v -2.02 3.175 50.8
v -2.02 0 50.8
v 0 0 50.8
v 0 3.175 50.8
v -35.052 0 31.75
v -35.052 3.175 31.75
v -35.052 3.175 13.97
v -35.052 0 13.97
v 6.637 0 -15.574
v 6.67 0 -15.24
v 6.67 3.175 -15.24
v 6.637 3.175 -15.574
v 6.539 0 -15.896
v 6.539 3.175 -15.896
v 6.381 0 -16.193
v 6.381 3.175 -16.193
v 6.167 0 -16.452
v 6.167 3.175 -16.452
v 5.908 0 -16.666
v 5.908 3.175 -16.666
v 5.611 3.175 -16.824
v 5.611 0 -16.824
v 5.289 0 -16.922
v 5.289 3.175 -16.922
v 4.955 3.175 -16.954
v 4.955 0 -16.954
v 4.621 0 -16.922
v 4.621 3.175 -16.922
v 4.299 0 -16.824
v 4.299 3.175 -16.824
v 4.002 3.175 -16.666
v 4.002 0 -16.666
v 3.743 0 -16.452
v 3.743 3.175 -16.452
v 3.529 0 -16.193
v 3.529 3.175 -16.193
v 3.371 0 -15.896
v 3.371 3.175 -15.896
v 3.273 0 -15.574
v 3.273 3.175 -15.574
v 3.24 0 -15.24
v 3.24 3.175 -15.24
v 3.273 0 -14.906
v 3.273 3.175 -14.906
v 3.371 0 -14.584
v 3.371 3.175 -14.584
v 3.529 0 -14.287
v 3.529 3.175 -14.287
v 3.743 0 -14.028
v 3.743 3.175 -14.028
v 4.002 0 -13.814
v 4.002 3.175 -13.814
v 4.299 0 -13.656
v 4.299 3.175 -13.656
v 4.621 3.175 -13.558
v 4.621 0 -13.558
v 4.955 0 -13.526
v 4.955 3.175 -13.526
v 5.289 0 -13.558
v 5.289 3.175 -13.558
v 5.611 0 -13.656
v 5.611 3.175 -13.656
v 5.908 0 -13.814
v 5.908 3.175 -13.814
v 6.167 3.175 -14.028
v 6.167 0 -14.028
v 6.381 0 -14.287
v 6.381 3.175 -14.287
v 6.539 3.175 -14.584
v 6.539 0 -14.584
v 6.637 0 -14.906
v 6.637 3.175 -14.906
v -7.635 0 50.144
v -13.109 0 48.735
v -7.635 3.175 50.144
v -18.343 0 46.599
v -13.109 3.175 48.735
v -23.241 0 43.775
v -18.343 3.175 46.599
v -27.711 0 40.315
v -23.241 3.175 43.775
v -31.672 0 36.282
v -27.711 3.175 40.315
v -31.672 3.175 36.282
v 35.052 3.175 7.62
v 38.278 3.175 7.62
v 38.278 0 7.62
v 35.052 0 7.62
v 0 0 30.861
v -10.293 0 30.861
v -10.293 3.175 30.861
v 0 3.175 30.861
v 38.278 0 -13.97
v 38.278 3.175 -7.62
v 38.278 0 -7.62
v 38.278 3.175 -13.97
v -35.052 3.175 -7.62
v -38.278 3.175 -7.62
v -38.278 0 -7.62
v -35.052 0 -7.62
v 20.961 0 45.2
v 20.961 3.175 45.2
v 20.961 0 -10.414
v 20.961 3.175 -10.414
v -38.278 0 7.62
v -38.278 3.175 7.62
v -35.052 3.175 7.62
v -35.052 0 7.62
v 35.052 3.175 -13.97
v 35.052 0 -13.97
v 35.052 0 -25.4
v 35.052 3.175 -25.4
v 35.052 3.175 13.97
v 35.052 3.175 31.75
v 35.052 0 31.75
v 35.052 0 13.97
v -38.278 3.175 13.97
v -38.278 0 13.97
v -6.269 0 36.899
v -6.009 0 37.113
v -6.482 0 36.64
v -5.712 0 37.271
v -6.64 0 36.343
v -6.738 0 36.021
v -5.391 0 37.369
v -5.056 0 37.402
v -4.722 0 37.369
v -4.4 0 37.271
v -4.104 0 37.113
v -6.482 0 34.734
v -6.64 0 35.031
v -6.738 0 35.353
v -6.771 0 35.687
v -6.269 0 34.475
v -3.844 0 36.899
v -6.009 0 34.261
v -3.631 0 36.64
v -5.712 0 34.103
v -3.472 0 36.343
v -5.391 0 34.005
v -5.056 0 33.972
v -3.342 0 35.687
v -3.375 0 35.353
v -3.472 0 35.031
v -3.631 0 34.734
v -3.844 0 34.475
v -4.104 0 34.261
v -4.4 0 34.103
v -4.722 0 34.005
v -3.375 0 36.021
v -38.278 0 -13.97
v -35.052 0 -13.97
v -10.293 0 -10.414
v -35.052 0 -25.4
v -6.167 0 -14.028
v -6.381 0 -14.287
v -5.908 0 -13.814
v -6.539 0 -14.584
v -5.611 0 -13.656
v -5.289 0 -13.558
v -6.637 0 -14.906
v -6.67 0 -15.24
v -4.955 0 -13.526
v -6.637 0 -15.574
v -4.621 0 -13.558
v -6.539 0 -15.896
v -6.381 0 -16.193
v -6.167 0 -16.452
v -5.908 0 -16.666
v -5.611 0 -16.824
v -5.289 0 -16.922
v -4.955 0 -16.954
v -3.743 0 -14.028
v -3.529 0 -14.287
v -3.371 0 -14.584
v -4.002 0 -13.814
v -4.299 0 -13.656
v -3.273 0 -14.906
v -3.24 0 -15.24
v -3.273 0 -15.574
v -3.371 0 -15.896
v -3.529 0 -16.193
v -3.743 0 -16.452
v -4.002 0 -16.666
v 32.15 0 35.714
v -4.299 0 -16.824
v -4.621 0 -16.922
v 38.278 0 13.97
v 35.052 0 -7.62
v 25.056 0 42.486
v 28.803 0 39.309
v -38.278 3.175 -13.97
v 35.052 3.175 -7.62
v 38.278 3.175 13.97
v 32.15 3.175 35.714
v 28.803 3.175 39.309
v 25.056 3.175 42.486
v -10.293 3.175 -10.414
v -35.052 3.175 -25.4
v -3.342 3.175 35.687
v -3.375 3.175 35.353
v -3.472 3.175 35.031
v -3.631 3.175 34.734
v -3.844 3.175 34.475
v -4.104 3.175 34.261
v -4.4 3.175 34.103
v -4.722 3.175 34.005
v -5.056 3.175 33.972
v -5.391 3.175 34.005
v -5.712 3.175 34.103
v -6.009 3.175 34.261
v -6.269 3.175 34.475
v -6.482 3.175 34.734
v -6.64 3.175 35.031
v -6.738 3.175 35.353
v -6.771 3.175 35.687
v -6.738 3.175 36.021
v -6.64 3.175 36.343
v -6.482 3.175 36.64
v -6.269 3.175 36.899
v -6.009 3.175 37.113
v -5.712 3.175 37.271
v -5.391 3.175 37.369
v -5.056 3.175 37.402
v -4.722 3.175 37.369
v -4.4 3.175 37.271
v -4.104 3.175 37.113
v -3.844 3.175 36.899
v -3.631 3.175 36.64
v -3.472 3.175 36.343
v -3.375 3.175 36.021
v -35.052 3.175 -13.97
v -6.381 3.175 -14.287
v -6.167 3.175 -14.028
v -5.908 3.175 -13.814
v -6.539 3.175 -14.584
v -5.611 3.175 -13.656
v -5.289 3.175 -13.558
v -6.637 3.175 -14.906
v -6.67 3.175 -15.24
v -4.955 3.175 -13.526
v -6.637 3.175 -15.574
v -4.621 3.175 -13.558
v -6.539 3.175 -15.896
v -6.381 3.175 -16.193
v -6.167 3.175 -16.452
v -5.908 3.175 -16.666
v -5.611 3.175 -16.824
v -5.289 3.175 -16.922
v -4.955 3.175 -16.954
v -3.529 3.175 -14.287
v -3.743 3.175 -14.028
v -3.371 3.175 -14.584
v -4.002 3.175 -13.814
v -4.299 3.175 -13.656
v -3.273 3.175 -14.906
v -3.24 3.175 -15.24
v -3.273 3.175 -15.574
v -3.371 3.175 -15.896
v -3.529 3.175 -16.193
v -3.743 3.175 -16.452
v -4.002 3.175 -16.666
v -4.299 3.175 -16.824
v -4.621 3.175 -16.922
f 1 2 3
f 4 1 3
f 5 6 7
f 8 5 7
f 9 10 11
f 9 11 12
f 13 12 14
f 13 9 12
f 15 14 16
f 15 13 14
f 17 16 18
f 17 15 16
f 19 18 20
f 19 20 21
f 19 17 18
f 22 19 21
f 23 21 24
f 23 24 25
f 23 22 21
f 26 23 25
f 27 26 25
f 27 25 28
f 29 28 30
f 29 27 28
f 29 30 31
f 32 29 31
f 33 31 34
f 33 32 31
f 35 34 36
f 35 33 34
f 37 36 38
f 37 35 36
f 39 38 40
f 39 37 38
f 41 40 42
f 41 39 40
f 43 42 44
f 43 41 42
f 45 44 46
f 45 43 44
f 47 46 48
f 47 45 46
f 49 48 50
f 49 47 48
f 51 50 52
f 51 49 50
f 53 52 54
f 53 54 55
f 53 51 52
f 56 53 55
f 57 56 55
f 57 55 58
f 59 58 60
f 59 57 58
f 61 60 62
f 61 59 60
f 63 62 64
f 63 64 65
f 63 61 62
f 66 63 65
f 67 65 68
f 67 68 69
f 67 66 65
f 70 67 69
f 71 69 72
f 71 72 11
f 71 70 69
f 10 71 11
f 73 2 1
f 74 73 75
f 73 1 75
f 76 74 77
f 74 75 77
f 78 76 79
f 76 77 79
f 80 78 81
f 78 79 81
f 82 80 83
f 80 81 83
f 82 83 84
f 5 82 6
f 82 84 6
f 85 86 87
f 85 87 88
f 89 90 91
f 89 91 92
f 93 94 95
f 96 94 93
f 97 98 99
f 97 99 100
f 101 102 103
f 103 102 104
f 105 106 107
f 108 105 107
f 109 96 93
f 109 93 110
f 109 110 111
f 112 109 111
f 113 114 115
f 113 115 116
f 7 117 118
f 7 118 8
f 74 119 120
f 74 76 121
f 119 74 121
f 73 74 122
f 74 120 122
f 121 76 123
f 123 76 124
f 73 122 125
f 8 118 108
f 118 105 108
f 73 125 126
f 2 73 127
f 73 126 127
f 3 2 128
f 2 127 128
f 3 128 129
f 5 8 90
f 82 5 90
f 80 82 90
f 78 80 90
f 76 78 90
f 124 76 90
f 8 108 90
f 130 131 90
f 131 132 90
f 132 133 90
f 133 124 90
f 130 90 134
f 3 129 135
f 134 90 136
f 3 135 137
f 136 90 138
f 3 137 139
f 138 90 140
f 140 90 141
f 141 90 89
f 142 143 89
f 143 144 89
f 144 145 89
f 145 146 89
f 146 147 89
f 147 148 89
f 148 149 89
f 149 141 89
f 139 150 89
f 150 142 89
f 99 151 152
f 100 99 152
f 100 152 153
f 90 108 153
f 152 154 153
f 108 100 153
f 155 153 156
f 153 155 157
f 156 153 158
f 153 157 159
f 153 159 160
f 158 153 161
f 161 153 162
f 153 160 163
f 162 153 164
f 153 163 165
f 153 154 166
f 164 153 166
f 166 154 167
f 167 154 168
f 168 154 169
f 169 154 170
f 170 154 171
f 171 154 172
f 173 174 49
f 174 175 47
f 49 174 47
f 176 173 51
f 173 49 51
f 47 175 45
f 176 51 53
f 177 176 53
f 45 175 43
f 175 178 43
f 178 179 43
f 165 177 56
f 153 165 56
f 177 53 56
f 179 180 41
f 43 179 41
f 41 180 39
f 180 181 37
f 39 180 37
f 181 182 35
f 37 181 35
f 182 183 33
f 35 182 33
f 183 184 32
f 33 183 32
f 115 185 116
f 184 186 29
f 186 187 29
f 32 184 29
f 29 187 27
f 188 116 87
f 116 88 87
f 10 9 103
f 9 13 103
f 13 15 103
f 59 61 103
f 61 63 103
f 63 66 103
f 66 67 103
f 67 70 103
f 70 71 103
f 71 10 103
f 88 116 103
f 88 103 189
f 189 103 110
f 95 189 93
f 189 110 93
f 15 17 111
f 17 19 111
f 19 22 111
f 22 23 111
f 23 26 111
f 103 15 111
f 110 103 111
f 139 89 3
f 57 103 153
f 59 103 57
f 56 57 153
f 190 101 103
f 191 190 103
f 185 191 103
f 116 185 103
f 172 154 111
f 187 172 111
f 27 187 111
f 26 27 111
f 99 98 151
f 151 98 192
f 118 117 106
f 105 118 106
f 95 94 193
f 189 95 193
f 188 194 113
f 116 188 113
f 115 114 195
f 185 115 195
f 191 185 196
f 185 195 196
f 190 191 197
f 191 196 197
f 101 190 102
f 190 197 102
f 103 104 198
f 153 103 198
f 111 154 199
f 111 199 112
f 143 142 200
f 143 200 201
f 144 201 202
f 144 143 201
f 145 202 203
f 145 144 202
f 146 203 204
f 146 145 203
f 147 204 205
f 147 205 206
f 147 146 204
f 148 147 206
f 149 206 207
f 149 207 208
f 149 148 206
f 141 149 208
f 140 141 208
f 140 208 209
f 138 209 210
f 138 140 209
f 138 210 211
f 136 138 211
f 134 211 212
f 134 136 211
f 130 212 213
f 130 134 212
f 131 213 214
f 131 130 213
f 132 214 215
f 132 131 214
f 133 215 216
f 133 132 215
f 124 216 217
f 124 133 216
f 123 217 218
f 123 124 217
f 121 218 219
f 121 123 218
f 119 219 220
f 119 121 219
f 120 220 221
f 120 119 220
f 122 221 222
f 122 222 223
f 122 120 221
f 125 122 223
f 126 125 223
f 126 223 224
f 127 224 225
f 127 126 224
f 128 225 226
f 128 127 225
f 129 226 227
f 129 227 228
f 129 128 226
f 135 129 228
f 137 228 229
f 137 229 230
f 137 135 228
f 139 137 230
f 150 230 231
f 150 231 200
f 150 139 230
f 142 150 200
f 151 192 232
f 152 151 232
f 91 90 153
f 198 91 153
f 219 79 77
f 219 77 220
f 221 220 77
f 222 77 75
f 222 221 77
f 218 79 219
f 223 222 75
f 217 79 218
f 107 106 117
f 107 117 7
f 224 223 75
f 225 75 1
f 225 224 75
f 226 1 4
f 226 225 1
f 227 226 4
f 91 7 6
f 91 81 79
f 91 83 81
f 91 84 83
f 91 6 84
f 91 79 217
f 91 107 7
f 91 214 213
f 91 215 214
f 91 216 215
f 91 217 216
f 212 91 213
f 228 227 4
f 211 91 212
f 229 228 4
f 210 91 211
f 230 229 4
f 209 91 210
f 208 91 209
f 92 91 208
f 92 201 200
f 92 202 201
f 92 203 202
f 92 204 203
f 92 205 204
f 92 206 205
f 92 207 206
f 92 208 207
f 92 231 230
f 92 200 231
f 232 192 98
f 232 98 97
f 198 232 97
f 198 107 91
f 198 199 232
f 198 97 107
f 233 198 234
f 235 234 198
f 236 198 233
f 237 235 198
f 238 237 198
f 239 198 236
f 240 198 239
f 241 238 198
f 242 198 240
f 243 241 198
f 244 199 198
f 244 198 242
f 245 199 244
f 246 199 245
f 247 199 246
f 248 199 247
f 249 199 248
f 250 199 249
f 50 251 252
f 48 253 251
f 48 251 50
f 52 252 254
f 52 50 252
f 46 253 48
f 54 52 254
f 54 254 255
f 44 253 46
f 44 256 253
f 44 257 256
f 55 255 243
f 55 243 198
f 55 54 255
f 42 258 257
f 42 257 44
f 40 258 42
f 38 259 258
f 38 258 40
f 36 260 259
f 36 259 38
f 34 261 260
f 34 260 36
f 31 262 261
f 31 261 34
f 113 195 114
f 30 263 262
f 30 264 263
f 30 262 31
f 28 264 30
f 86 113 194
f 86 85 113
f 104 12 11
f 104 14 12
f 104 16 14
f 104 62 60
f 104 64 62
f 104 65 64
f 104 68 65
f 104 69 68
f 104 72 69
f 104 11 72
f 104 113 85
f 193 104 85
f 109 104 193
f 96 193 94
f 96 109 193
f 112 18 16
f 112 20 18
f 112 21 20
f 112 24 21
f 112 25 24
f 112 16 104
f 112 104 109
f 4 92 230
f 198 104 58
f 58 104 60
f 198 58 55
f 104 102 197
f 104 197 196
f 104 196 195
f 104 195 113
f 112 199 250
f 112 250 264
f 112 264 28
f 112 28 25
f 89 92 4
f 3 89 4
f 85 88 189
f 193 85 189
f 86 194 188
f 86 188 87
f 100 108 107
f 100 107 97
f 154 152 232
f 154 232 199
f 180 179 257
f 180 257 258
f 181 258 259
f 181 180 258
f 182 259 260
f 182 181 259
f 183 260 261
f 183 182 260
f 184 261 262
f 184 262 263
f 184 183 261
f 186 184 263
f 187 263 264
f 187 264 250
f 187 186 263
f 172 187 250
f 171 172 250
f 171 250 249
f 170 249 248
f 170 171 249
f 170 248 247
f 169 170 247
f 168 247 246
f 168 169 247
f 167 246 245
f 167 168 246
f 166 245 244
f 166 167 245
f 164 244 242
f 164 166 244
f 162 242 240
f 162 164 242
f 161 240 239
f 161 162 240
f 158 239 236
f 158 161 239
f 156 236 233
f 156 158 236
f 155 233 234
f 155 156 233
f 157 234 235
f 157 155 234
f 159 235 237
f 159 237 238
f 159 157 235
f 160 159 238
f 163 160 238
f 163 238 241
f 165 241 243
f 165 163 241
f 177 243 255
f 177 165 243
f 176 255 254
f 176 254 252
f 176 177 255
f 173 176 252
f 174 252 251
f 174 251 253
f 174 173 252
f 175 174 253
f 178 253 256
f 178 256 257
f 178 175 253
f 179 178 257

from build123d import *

# Parameters (mm, degrees)
SKETCH1_W              = 70.104
SKETCH1_H              = 50.8
RECTANGULAR_BASE_DEPTH = 3.175
SKETCH4_W              = 3.2258
SKETCH4_H              = 6.35
TAB_DEPTH              = 3.175
SKETCH8_W              = 70.104
SKETCH8_H              = 25.4
BOSS_EXTRUDE2_DEPTH    = 3.175
CUT_EXTRUDE2_OUTLINE_R = 1.7145
CUT_EXTRUDE2_OUTLINE_W = 20.586
CUT_EXTRUDE2_OUTLINE_H = 41.275
CUT_EXTRUDE2_DEPTH     = 3.175
CUT_EXTRUDE3_DEPTH     = 64.686031419
CUT_EXTRUDE4_DEPTH     = 64.686031419


# Read off the part's stored shape, not the designer's step: Cut-Extrude2
with BuildPart() as part:
    # Sketch1 → rectangular base (new body)
    with BuildSketch(Plane(origin=(0, 0, 0), x_dir=(1, 0, 0), z_dir=(0, 1, 0))):
        Rectangle(SKETCH1_W, SKETCH1_H)
    extrude(amount=RECTANGULAR_BASE_DEPTH)

    # Sketch4 → tab (add)
    with BuildSketch(Plane(origin=(0, 3.175, 0), x_dir=(1, 0, 0), z_dir=(0, 1, 0))):
        with Locations((-36.6649, 10.795)):
            Rectangle(SKETCH4_W, SKETCH4_H)
        with Locations((-36.6649, -10.795)):
            Rectangle(SKETCH4_W, SKETCH4_H)
    tab = extrude(amount=-TAB_DEPTH)

    # Mirror1: tab across plane
    add(tab.mirror(Plane(origin=(0, 0, 0), x_dir=(0, 0, 1), z_dir=(1, 0, 0))))

    # Sketch8 → Boss-Extrude2 (add)
    with BuildSketch(Plane(origin=(0, 3.175, 0), x_dir=(1, 0, 0), z_dir=(0, 1, 0))):
        with Locations((0, -38.1)):
            Rectangle(SKETCH8_W, SKETCH8_H)
    extrude(amount=-BOSS_EXTRUDE2_DEPTH)

    # Cut-Extrude2 outline → Cut-Extrude2 (cut)
    with BuildSketch(Plane(origin=(0, 0, 0), x_dir=(1, 0, 0), z_dir=(0, 1, 0))):
        with Locations((4.955, 15.24)):
            Circle(CUT_EXTRUDE2_OUTLINE_R)
        with Locations((-4.955, 15.24)):
            Circle(CUT_EXTRUDE2_OUTLINE_R)
        with Locations((4.853793359, -35.687)):
            Circle(CUT_EXTRUDE2_OUTLINE_R)
        with Locations((-5.056206641, -35.687)):
            Circle(CUT_EXTRUDE2_OUTLINE_R)
        with Locations((0, -10.2235)):
            Rectangle(CUT_EXTRUDE2_OUTLINE_W, CUT_EXTRUDE2_OUTLINE_H)
    extrude(amount=CUT_EXTRUDE2_DEPTH, mode=Mode.SUBTRACT)

    # Sketch9 → Cut-Extrude3 (cut, through all)
    with BuildSketch(Plane(origin=(0, 3.175, 0), x_dir=(1, 0, 0), z_dir=(0, 1, 0))):
        Polygon((0, -30.861), (0, -50.8), (10.293, -50.8), (20.961, -50.8), (20.961, 10.414), (10.293, 10.414), (10.293, -30.861), align=None)
    extrude(amount=-CUT_EXTRUDE3_DEPTH, mode=Mode.SUBTRACT)

    # Sketch10 → Cut-Extrude4 (cut, through all)
    with BuildSketch(Plane(origin=(0, 3.175, 0), x_dir=(1, 0, 0), z_dir=(0, 1, 0))):
        with BuildLine():
            Line((-35.052, -31.75), (-35.052, -60.151970588))
            Line((-35.052, -60.151970588), (35.052, -60.151970588))
            Line((35.052, -60.151970588), (35.052, -31.75))
            ThreePointArc((35.052, -31.75), (0, -50.84891964), (-35.052, -31.75))
        make_face()
    extrude(amount=-CUT_EXTRUDE4_DEPTH, mode=Mode.SUBTRACT)


solid = part.part
